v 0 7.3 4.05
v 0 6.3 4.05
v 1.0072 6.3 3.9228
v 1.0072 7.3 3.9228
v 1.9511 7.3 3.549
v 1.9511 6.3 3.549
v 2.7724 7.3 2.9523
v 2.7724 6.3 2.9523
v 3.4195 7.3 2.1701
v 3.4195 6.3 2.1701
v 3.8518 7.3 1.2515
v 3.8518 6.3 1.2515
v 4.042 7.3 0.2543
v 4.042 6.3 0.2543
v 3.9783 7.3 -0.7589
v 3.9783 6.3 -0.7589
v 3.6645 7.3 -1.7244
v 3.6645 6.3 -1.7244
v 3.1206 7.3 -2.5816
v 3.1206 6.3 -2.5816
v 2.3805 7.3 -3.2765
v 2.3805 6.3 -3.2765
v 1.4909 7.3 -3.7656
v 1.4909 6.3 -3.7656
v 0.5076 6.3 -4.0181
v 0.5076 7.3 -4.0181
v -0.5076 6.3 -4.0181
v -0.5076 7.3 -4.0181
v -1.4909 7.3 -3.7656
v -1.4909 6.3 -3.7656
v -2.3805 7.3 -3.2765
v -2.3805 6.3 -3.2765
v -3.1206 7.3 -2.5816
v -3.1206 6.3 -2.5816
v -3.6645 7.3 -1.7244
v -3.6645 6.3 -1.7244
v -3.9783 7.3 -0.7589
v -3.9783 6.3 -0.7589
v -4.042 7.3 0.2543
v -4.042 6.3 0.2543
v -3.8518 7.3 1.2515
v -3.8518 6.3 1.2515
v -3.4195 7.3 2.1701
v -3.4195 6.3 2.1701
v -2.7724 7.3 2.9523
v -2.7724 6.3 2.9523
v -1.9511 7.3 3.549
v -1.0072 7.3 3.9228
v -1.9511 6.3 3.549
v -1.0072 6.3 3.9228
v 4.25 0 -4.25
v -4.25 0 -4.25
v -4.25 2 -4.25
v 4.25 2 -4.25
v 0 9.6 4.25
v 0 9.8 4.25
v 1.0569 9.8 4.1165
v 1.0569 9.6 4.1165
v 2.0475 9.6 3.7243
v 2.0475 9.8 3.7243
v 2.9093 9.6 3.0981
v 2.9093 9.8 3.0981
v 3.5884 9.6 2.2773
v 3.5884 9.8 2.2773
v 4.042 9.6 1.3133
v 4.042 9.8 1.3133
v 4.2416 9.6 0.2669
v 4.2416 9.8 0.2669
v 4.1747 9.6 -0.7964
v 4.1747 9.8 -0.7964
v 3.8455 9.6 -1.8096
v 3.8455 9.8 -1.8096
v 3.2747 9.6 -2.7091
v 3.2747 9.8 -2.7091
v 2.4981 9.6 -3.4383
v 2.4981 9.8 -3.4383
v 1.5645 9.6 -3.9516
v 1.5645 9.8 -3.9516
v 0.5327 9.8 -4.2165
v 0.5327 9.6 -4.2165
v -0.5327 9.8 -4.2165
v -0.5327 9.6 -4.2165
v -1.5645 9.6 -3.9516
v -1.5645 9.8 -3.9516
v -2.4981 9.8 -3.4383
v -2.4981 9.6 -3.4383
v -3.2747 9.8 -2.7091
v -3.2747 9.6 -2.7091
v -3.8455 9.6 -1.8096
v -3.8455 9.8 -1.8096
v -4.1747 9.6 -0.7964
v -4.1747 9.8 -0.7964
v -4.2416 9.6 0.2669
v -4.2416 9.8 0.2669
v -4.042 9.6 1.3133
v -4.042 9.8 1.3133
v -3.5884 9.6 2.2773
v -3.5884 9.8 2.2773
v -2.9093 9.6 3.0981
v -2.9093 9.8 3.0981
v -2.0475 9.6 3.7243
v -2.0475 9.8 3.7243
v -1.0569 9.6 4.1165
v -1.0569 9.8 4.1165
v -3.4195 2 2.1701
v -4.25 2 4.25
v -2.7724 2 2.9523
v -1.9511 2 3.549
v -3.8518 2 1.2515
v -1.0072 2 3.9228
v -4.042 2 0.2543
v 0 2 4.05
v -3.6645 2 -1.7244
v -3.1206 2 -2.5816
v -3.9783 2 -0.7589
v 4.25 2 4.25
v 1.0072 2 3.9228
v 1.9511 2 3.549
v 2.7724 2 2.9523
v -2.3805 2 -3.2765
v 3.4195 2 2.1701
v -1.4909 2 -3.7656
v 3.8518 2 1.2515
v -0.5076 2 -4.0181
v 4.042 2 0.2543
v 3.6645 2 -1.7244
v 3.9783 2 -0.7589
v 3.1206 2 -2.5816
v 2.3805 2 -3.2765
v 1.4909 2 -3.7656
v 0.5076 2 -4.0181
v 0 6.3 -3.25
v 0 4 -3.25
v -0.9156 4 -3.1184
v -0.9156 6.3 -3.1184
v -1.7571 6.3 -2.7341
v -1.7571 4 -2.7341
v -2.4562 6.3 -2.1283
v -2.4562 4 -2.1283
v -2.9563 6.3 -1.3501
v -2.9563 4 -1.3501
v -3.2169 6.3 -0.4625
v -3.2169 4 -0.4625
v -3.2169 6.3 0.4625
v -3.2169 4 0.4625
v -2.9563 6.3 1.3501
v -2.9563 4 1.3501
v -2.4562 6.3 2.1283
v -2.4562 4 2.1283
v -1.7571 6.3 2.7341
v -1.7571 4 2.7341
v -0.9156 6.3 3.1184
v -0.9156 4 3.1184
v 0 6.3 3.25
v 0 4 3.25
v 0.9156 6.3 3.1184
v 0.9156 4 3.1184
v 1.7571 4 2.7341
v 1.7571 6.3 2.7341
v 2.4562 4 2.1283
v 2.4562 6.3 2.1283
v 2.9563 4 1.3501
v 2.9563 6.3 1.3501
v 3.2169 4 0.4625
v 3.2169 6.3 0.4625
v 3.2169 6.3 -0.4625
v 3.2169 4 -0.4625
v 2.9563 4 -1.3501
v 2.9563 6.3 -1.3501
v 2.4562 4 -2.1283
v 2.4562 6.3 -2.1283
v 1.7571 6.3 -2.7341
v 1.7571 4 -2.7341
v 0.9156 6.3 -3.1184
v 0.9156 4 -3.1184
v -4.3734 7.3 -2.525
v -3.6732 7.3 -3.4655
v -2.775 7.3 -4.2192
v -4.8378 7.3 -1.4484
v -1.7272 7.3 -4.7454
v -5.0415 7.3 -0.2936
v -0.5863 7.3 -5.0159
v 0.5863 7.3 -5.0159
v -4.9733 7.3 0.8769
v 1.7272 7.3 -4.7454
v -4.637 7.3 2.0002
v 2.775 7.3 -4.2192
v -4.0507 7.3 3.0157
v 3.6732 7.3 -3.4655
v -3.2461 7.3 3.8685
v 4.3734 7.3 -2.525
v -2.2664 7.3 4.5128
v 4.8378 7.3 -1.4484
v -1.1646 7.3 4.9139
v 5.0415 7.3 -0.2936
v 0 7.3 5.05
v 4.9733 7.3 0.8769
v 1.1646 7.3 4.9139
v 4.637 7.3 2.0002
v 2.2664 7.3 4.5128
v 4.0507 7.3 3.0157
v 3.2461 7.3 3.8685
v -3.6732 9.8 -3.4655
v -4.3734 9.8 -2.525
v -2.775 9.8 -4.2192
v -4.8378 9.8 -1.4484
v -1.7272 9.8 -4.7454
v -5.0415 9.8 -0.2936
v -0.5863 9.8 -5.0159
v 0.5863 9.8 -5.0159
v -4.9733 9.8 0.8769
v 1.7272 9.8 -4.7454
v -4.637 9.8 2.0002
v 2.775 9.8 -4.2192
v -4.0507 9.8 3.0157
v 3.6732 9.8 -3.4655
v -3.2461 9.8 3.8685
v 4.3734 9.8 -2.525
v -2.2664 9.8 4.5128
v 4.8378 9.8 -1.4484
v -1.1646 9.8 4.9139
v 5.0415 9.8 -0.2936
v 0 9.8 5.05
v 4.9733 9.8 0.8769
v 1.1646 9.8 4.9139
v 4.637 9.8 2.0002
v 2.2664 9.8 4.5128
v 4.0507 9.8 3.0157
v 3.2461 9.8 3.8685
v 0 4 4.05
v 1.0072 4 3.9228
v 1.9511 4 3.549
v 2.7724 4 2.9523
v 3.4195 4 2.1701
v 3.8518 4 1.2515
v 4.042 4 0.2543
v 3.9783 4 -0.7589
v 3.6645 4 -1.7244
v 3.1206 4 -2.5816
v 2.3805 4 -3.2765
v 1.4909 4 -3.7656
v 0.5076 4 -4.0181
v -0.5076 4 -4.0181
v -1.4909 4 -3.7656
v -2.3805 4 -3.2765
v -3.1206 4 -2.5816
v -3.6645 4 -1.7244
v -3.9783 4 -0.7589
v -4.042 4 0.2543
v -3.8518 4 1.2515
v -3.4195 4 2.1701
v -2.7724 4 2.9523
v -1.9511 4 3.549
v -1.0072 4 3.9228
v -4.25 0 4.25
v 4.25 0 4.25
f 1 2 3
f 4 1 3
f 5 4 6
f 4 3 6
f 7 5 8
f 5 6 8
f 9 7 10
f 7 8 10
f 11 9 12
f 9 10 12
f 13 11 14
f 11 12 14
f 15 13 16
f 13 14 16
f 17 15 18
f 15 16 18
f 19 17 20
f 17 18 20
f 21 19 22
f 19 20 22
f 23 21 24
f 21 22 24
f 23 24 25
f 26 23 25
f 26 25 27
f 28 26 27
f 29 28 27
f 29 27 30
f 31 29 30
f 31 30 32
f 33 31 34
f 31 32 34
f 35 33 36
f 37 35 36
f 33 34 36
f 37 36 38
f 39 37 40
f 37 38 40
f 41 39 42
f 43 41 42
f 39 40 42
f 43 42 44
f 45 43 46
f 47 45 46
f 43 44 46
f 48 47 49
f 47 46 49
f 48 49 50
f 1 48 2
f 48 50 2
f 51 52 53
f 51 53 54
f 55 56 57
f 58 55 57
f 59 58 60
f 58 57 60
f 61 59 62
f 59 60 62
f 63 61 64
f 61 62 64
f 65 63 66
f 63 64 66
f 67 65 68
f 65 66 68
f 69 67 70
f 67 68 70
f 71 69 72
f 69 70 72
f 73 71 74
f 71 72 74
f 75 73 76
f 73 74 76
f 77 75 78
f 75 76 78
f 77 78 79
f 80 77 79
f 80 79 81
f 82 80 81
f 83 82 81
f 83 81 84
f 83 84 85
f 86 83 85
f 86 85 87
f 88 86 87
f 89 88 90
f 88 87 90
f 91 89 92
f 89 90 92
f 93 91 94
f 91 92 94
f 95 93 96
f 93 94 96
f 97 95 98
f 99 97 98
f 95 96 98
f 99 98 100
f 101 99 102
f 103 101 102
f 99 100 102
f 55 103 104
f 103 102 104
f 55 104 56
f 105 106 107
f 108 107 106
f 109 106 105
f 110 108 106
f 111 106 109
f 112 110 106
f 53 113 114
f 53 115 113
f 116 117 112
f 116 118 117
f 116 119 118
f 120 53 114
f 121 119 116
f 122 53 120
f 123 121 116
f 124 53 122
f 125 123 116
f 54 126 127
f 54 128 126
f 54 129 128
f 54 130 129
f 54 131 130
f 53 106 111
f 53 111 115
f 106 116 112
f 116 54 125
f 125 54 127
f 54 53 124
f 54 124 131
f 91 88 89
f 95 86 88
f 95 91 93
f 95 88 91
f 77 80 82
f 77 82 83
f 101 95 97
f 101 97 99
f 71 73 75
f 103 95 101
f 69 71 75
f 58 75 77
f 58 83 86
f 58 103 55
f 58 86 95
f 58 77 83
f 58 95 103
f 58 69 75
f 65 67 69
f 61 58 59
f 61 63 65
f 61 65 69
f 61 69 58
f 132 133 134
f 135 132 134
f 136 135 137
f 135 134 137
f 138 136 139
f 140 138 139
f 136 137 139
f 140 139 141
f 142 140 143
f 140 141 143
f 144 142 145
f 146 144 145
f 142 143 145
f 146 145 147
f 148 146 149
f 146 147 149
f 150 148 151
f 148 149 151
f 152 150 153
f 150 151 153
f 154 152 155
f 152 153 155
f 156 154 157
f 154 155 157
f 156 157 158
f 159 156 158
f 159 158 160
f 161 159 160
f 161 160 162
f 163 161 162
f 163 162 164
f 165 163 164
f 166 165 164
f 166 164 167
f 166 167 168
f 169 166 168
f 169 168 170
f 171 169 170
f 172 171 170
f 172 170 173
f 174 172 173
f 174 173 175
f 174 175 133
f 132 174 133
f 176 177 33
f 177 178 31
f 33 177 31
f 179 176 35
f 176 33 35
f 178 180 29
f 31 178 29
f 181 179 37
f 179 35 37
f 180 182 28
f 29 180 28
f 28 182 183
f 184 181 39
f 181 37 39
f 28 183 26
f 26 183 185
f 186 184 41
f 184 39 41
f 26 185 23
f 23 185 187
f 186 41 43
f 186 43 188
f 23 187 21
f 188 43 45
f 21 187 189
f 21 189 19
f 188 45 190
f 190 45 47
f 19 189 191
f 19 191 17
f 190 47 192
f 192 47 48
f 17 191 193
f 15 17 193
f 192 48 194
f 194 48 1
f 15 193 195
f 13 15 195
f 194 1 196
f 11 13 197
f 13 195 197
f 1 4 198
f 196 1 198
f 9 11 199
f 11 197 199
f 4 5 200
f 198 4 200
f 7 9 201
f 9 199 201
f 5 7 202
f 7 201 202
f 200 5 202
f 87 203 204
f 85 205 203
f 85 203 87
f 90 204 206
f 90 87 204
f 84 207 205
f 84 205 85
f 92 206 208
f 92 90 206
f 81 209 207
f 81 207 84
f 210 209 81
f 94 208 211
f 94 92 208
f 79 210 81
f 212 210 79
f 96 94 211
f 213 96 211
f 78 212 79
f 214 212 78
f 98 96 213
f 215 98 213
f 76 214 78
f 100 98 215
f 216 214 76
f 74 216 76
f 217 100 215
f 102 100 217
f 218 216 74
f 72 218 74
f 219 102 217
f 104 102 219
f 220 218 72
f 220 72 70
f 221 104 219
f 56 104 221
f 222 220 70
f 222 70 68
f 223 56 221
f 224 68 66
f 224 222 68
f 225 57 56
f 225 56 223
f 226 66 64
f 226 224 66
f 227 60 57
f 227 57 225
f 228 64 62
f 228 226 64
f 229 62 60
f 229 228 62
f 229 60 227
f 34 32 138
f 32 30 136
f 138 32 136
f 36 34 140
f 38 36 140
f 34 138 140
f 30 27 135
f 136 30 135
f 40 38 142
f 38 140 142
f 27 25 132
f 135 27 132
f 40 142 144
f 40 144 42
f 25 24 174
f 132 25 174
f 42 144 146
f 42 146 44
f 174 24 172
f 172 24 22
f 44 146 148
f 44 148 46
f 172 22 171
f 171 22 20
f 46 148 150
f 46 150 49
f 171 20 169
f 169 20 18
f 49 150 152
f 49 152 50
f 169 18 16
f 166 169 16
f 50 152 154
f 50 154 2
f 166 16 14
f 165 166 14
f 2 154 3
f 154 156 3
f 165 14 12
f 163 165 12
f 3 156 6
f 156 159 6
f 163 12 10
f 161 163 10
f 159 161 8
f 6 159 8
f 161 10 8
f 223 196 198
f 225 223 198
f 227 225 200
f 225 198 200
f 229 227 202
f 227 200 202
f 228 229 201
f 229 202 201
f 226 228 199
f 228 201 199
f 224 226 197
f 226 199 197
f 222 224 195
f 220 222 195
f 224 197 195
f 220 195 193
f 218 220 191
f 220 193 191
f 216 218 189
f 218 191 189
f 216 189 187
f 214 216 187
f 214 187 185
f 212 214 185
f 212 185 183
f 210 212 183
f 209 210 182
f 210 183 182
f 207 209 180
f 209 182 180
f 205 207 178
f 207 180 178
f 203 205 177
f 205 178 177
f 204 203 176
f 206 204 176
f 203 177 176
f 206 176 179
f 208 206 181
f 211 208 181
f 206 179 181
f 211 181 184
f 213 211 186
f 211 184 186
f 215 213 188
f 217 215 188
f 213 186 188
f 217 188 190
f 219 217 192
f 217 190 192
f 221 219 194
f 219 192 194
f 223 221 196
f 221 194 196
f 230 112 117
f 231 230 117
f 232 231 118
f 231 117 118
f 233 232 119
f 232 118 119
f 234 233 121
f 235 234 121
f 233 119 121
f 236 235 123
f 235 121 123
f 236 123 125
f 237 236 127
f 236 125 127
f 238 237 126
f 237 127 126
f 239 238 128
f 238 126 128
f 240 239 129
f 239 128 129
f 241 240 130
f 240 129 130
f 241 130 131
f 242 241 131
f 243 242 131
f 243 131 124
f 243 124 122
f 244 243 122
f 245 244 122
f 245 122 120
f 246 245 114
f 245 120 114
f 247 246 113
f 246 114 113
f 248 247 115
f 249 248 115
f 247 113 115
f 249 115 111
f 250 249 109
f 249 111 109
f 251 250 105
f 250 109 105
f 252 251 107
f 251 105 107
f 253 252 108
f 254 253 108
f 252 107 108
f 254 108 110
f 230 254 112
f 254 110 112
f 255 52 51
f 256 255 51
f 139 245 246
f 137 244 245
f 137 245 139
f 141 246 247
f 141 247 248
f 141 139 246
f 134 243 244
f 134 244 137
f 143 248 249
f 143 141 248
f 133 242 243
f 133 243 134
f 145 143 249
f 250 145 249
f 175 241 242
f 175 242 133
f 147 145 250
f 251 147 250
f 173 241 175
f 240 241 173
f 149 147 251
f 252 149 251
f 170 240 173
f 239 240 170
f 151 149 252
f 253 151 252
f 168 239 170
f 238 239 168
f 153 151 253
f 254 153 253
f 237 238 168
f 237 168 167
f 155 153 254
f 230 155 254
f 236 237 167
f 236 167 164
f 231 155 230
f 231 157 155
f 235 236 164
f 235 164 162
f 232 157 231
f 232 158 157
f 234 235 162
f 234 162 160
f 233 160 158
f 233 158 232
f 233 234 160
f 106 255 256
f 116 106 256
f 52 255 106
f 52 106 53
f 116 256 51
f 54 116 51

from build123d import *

# Parameters (mm, degrees)
SKETCH1_W           = 8.5
SKETCH1_H           = 8.5
BOSS_EXTRUDE1_DEPTH = 2
SKETCH2_R           = 4.05
SKETCH2_R_2         = 3.25
BOSS_EXTRUDE2_DEPTH = 2
SKETCH3_R           = 3.25
BOSS_EXTRUDE3_DEPTH = 4.3
SKETCH4_R           = 4.05
BOSS_EXTRUDE4_DEPTH = 1
SKETCH5_R           = 5.05
BOSS_EXTRUDE5_DEPTH = 2.5
SKETCH6_R           = 4.25
CUT_EXTRUDE1_DEPTH  = 0.2


with BuildPart() as part:
    # Sketch1 → Boss-Extrude1 (new body)
    with BuildSketch(Plane(origin=(0, 0, 0), x_dir=(1, 0, 0), z_dir=(0, 1, 0))):
        Rectangle(SKETCH1_W, SKETCH1_H)
    extrude(amount=BOSS_EXTRUDE1_DEPTH)

    # Sketch2 → Boss-Extrude2 (add)
    with BuildSketch(Plane(origin=(0, 2, 0), x_dir=(1, 0, 0), z_dir=(0, 1, 0))):
        with Locations(Location((0, 0, 0), (0, 0, 270))):
            Circle(SKETCH2_R)
        with Locations(Location((0, 0, 0), (0, 0, 270))):
            Circle(SKETCH2_R_2, mode=Mode.SUBTRACT)
    extrude(amount=BOSS_EXTRUDE2_DEPTH)

    # Sketch3 → Boss-Extrude3 (add)
    with BuildSketch(Plane(origin=(0, 2, 0), x_dir=(1, 0, 0), z_dir=(0, 1, 0))):
        with Locations(Location((0, 0, 0), (0, 0, 90))):
            Circle(SKETCH3_R)
    extrude(amount=BOSS_EXTRUDE3_DEPTH)

    # Sketch4 → Boss-Extrude4 (add)
    with BuildSketch(Plane(origin=(0, 6.3, 0), x_dir=(1, 0, 0), z_dir=(0, 1, 0))):
        with Locations(Location((0, 0, 0), (0, 0, 270))):
            Circle(SKETCH4_R)
    extrude(amount=BOSS_EXTRUDE4_DEPTH)

    # Sketch5 → Boss-Extrude5 (add)
    with BuildSketch(Plane(origin=(0, 7.3, 0), x_dir=(1, 0, 0), z_dir=(0, 1, 0))):
        with Locations(Location((0, 0, 0), (0, 0, 270))):
            Circle(SKETCH5_R)
    extrude(amount=BOSS_EXTRUDE5_DEPTH)

    # Sketch6 → Cut-Extrude1 (cut)
    with BuildSketch(Plane(origin=(0, 9.8, 0), x_dir=(1, 0, 0), z_dir=(0, 1, 0))):
        with Locations(Location((0, 0, 0), (0, 0, 270))):
            Circle(SKETCH6_R)
    extrude(amount=-CUT_EXTRUDE1_DEPTH, mode=Mode.SUBTRACT)


solid = part.part
